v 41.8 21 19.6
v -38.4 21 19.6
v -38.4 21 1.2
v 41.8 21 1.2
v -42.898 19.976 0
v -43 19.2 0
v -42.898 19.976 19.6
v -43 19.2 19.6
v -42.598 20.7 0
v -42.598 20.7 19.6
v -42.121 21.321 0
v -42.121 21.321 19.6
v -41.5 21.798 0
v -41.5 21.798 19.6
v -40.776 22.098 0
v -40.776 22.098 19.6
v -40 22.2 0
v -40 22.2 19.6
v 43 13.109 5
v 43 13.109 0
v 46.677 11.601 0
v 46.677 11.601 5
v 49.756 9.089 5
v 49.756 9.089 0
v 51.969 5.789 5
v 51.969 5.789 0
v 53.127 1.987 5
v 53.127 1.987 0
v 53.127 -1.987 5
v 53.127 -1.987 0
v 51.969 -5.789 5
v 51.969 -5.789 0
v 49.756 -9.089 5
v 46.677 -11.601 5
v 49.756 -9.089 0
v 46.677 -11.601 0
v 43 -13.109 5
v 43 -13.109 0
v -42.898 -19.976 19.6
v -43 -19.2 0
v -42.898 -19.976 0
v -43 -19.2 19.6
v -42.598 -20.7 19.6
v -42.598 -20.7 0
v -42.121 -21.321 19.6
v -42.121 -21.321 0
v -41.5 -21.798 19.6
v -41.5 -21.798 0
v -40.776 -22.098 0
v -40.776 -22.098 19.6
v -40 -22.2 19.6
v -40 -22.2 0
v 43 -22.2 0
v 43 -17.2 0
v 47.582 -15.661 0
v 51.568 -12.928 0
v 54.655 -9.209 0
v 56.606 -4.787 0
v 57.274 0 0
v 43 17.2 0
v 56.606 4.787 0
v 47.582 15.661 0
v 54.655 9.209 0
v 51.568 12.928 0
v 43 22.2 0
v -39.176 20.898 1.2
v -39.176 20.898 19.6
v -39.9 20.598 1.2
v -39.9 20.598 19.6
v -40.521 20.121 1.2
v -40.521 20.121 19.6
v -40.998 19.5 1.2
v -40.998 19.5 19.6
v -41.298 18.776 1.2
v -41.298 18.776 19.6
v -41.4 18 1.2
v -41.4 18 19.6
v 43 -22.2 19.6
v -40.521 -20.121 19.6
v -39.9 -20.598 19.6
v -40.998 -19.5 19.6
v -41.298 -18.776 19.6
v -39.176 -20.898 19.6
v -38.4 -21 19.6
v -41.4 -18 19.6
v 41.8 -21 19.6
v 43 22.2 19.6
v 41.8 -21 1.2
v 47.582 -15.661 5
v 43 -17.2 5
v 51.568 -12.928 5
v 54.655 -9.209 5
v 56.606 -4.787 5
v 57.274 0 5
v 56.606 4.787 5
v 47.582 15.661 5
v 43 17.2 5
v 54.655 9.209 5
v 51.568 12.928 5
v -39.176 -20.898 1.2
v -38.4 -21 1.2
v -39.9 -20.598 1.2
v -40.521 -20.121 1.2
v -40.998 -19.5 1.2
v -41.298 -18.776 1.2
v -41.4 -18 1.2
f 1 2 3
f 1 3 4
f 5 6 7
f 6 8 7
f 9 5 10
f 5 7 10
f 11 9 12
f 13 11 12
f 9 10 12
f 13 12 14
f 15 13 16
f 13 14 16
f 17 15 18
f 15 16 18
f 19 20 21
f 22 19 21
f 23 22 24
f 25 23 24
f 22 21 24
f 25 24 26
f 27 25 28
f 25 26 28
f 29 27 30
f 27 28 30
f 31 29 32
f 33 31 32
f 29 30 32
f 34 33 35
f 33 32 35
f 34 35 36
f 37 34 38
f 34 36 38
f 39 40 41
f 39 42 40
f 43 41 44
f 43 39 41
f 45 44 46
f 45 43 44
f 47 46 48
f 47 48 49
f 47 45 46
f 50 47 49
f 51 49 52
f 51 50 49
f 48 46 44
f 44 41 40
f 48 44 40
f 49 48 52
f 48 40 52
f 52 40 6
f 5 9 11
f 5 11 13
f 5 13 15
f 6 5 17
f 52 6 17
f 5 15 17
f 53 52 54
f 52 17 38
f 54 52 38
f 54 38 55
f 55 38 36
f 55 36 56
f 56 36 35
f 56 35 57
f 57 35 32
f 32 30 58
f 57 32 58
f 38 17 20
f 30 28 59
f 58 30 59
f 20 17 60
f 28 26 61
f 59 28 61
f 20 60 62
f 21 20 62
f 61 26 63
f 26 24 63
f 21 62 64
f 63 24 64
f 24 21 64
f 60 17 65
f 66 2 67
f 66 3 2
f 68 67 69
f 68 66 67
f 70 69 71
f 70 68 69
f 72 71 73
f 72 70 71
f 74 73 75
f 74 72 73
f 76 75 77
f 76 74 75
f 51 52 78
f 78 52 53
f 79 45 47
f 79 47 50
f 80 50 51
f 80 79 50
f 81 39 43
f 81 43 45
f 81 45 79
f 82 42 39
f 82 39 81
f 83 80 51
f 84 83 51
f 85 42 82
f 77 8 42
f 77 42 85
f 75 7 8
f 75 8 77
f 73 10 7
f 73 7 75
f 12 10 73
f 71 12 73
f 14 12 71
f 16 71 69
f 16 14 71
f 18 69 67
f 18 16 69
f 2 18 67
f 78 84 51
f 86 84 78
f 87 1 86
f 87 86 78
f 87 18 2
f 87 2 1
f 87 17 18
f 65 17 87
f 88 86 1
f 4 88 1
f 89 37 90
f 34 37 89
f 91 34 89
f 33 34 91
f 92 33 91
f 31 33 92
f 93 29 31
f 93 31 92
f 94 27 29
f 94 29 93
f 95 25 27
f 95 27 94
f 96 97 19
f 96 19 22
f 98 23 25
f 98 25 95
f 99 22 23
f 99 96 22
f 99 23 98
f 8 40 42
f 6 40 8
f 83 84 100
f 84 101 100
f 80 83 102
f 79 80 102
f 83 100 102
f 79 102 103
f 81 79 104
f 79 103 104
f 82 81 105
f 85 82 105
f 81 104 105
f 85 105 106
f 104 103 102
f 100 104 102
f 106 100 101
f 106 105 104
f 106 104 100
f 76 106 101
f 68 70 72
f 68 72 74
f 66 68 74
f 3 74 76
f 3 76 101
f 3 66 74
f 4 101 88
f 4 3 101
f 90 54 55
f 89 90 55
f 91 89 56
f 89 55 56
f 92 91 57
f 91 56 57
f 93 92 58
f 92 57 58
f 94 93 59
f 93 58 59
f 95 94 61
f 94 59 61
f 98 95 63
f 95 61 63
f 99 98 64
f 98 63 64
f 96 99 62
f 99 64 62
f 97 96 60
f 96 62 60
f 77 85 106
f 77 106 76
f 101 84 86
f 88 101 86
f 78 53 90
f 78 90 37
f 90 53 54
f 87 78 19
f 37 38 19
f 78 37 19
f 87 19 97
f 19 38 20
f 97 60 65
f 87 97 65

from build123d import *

# Parameters (mm, degrees)
SKETCH_1_W          = 86
SKETCH_1_H          = 44.4
EXTRUDE_1_DEPTH     = 19.6
EXTRUDE_2_DEPTH     = 5
SKETCH_3_W          = 83.2
SKETCH_3_H          = 42
CUT_EXTRUDE_1_DEPTH = 18.4
FILLET_1_R          = 3


with BuildPart() as part:
    # Эскиз1 → Бобышка-Вытянуть1 (new body)
    with BuildSketch(Plane.XY):
        Rectangle(SKETCH_1_W, SKETCH_1_H)
    extrude(amount=EXTRUDE_1_DEPTH)

    # Эскиз2 → Бобышка-Вытянуть2 (add)
    with BuildSketch(Plane.XY):
        with BuildLine():
            Line((43, 17.2), (43, 13.108775687))
            ThreePointArc((43, 13.108775687), (53.273546839, 0), (43, -13.108775687))
            Line((43, -13.108775687), (43, -17.2))
            ThreePointArc((43, -17.2), (57.273546839, 0), (43, 17.2))
        make_face()
    extrude(amount=EXTRUDE_2_DEPTH)

    # Эскиз3 → Вырез-Вытянуть1 (cut)
    with BuildSketch(Plane.XY.offset(19.6)):
        with Locations((0.2, 0)):
            Rectangle(SKETCH_3_W, SKETCH_3_H)
    extrude(amount=-CUT_EXTRUDE_1_DEPTH, mode=Mode.SUBTRACT)

    # Скругление1
    fillet_1_edges = [part.edges().sort_by_distance(p)[0] for p in [
        (-41.4, -21, 10.4),
        (-41.4, 21, 10.4),
        (-43, -22.2, 9.8),
        (-43, 22.2, 9.8),
    ]]
    fillet(fillet_1_edges, radius=FILLET_1_R)


solid = part.part
